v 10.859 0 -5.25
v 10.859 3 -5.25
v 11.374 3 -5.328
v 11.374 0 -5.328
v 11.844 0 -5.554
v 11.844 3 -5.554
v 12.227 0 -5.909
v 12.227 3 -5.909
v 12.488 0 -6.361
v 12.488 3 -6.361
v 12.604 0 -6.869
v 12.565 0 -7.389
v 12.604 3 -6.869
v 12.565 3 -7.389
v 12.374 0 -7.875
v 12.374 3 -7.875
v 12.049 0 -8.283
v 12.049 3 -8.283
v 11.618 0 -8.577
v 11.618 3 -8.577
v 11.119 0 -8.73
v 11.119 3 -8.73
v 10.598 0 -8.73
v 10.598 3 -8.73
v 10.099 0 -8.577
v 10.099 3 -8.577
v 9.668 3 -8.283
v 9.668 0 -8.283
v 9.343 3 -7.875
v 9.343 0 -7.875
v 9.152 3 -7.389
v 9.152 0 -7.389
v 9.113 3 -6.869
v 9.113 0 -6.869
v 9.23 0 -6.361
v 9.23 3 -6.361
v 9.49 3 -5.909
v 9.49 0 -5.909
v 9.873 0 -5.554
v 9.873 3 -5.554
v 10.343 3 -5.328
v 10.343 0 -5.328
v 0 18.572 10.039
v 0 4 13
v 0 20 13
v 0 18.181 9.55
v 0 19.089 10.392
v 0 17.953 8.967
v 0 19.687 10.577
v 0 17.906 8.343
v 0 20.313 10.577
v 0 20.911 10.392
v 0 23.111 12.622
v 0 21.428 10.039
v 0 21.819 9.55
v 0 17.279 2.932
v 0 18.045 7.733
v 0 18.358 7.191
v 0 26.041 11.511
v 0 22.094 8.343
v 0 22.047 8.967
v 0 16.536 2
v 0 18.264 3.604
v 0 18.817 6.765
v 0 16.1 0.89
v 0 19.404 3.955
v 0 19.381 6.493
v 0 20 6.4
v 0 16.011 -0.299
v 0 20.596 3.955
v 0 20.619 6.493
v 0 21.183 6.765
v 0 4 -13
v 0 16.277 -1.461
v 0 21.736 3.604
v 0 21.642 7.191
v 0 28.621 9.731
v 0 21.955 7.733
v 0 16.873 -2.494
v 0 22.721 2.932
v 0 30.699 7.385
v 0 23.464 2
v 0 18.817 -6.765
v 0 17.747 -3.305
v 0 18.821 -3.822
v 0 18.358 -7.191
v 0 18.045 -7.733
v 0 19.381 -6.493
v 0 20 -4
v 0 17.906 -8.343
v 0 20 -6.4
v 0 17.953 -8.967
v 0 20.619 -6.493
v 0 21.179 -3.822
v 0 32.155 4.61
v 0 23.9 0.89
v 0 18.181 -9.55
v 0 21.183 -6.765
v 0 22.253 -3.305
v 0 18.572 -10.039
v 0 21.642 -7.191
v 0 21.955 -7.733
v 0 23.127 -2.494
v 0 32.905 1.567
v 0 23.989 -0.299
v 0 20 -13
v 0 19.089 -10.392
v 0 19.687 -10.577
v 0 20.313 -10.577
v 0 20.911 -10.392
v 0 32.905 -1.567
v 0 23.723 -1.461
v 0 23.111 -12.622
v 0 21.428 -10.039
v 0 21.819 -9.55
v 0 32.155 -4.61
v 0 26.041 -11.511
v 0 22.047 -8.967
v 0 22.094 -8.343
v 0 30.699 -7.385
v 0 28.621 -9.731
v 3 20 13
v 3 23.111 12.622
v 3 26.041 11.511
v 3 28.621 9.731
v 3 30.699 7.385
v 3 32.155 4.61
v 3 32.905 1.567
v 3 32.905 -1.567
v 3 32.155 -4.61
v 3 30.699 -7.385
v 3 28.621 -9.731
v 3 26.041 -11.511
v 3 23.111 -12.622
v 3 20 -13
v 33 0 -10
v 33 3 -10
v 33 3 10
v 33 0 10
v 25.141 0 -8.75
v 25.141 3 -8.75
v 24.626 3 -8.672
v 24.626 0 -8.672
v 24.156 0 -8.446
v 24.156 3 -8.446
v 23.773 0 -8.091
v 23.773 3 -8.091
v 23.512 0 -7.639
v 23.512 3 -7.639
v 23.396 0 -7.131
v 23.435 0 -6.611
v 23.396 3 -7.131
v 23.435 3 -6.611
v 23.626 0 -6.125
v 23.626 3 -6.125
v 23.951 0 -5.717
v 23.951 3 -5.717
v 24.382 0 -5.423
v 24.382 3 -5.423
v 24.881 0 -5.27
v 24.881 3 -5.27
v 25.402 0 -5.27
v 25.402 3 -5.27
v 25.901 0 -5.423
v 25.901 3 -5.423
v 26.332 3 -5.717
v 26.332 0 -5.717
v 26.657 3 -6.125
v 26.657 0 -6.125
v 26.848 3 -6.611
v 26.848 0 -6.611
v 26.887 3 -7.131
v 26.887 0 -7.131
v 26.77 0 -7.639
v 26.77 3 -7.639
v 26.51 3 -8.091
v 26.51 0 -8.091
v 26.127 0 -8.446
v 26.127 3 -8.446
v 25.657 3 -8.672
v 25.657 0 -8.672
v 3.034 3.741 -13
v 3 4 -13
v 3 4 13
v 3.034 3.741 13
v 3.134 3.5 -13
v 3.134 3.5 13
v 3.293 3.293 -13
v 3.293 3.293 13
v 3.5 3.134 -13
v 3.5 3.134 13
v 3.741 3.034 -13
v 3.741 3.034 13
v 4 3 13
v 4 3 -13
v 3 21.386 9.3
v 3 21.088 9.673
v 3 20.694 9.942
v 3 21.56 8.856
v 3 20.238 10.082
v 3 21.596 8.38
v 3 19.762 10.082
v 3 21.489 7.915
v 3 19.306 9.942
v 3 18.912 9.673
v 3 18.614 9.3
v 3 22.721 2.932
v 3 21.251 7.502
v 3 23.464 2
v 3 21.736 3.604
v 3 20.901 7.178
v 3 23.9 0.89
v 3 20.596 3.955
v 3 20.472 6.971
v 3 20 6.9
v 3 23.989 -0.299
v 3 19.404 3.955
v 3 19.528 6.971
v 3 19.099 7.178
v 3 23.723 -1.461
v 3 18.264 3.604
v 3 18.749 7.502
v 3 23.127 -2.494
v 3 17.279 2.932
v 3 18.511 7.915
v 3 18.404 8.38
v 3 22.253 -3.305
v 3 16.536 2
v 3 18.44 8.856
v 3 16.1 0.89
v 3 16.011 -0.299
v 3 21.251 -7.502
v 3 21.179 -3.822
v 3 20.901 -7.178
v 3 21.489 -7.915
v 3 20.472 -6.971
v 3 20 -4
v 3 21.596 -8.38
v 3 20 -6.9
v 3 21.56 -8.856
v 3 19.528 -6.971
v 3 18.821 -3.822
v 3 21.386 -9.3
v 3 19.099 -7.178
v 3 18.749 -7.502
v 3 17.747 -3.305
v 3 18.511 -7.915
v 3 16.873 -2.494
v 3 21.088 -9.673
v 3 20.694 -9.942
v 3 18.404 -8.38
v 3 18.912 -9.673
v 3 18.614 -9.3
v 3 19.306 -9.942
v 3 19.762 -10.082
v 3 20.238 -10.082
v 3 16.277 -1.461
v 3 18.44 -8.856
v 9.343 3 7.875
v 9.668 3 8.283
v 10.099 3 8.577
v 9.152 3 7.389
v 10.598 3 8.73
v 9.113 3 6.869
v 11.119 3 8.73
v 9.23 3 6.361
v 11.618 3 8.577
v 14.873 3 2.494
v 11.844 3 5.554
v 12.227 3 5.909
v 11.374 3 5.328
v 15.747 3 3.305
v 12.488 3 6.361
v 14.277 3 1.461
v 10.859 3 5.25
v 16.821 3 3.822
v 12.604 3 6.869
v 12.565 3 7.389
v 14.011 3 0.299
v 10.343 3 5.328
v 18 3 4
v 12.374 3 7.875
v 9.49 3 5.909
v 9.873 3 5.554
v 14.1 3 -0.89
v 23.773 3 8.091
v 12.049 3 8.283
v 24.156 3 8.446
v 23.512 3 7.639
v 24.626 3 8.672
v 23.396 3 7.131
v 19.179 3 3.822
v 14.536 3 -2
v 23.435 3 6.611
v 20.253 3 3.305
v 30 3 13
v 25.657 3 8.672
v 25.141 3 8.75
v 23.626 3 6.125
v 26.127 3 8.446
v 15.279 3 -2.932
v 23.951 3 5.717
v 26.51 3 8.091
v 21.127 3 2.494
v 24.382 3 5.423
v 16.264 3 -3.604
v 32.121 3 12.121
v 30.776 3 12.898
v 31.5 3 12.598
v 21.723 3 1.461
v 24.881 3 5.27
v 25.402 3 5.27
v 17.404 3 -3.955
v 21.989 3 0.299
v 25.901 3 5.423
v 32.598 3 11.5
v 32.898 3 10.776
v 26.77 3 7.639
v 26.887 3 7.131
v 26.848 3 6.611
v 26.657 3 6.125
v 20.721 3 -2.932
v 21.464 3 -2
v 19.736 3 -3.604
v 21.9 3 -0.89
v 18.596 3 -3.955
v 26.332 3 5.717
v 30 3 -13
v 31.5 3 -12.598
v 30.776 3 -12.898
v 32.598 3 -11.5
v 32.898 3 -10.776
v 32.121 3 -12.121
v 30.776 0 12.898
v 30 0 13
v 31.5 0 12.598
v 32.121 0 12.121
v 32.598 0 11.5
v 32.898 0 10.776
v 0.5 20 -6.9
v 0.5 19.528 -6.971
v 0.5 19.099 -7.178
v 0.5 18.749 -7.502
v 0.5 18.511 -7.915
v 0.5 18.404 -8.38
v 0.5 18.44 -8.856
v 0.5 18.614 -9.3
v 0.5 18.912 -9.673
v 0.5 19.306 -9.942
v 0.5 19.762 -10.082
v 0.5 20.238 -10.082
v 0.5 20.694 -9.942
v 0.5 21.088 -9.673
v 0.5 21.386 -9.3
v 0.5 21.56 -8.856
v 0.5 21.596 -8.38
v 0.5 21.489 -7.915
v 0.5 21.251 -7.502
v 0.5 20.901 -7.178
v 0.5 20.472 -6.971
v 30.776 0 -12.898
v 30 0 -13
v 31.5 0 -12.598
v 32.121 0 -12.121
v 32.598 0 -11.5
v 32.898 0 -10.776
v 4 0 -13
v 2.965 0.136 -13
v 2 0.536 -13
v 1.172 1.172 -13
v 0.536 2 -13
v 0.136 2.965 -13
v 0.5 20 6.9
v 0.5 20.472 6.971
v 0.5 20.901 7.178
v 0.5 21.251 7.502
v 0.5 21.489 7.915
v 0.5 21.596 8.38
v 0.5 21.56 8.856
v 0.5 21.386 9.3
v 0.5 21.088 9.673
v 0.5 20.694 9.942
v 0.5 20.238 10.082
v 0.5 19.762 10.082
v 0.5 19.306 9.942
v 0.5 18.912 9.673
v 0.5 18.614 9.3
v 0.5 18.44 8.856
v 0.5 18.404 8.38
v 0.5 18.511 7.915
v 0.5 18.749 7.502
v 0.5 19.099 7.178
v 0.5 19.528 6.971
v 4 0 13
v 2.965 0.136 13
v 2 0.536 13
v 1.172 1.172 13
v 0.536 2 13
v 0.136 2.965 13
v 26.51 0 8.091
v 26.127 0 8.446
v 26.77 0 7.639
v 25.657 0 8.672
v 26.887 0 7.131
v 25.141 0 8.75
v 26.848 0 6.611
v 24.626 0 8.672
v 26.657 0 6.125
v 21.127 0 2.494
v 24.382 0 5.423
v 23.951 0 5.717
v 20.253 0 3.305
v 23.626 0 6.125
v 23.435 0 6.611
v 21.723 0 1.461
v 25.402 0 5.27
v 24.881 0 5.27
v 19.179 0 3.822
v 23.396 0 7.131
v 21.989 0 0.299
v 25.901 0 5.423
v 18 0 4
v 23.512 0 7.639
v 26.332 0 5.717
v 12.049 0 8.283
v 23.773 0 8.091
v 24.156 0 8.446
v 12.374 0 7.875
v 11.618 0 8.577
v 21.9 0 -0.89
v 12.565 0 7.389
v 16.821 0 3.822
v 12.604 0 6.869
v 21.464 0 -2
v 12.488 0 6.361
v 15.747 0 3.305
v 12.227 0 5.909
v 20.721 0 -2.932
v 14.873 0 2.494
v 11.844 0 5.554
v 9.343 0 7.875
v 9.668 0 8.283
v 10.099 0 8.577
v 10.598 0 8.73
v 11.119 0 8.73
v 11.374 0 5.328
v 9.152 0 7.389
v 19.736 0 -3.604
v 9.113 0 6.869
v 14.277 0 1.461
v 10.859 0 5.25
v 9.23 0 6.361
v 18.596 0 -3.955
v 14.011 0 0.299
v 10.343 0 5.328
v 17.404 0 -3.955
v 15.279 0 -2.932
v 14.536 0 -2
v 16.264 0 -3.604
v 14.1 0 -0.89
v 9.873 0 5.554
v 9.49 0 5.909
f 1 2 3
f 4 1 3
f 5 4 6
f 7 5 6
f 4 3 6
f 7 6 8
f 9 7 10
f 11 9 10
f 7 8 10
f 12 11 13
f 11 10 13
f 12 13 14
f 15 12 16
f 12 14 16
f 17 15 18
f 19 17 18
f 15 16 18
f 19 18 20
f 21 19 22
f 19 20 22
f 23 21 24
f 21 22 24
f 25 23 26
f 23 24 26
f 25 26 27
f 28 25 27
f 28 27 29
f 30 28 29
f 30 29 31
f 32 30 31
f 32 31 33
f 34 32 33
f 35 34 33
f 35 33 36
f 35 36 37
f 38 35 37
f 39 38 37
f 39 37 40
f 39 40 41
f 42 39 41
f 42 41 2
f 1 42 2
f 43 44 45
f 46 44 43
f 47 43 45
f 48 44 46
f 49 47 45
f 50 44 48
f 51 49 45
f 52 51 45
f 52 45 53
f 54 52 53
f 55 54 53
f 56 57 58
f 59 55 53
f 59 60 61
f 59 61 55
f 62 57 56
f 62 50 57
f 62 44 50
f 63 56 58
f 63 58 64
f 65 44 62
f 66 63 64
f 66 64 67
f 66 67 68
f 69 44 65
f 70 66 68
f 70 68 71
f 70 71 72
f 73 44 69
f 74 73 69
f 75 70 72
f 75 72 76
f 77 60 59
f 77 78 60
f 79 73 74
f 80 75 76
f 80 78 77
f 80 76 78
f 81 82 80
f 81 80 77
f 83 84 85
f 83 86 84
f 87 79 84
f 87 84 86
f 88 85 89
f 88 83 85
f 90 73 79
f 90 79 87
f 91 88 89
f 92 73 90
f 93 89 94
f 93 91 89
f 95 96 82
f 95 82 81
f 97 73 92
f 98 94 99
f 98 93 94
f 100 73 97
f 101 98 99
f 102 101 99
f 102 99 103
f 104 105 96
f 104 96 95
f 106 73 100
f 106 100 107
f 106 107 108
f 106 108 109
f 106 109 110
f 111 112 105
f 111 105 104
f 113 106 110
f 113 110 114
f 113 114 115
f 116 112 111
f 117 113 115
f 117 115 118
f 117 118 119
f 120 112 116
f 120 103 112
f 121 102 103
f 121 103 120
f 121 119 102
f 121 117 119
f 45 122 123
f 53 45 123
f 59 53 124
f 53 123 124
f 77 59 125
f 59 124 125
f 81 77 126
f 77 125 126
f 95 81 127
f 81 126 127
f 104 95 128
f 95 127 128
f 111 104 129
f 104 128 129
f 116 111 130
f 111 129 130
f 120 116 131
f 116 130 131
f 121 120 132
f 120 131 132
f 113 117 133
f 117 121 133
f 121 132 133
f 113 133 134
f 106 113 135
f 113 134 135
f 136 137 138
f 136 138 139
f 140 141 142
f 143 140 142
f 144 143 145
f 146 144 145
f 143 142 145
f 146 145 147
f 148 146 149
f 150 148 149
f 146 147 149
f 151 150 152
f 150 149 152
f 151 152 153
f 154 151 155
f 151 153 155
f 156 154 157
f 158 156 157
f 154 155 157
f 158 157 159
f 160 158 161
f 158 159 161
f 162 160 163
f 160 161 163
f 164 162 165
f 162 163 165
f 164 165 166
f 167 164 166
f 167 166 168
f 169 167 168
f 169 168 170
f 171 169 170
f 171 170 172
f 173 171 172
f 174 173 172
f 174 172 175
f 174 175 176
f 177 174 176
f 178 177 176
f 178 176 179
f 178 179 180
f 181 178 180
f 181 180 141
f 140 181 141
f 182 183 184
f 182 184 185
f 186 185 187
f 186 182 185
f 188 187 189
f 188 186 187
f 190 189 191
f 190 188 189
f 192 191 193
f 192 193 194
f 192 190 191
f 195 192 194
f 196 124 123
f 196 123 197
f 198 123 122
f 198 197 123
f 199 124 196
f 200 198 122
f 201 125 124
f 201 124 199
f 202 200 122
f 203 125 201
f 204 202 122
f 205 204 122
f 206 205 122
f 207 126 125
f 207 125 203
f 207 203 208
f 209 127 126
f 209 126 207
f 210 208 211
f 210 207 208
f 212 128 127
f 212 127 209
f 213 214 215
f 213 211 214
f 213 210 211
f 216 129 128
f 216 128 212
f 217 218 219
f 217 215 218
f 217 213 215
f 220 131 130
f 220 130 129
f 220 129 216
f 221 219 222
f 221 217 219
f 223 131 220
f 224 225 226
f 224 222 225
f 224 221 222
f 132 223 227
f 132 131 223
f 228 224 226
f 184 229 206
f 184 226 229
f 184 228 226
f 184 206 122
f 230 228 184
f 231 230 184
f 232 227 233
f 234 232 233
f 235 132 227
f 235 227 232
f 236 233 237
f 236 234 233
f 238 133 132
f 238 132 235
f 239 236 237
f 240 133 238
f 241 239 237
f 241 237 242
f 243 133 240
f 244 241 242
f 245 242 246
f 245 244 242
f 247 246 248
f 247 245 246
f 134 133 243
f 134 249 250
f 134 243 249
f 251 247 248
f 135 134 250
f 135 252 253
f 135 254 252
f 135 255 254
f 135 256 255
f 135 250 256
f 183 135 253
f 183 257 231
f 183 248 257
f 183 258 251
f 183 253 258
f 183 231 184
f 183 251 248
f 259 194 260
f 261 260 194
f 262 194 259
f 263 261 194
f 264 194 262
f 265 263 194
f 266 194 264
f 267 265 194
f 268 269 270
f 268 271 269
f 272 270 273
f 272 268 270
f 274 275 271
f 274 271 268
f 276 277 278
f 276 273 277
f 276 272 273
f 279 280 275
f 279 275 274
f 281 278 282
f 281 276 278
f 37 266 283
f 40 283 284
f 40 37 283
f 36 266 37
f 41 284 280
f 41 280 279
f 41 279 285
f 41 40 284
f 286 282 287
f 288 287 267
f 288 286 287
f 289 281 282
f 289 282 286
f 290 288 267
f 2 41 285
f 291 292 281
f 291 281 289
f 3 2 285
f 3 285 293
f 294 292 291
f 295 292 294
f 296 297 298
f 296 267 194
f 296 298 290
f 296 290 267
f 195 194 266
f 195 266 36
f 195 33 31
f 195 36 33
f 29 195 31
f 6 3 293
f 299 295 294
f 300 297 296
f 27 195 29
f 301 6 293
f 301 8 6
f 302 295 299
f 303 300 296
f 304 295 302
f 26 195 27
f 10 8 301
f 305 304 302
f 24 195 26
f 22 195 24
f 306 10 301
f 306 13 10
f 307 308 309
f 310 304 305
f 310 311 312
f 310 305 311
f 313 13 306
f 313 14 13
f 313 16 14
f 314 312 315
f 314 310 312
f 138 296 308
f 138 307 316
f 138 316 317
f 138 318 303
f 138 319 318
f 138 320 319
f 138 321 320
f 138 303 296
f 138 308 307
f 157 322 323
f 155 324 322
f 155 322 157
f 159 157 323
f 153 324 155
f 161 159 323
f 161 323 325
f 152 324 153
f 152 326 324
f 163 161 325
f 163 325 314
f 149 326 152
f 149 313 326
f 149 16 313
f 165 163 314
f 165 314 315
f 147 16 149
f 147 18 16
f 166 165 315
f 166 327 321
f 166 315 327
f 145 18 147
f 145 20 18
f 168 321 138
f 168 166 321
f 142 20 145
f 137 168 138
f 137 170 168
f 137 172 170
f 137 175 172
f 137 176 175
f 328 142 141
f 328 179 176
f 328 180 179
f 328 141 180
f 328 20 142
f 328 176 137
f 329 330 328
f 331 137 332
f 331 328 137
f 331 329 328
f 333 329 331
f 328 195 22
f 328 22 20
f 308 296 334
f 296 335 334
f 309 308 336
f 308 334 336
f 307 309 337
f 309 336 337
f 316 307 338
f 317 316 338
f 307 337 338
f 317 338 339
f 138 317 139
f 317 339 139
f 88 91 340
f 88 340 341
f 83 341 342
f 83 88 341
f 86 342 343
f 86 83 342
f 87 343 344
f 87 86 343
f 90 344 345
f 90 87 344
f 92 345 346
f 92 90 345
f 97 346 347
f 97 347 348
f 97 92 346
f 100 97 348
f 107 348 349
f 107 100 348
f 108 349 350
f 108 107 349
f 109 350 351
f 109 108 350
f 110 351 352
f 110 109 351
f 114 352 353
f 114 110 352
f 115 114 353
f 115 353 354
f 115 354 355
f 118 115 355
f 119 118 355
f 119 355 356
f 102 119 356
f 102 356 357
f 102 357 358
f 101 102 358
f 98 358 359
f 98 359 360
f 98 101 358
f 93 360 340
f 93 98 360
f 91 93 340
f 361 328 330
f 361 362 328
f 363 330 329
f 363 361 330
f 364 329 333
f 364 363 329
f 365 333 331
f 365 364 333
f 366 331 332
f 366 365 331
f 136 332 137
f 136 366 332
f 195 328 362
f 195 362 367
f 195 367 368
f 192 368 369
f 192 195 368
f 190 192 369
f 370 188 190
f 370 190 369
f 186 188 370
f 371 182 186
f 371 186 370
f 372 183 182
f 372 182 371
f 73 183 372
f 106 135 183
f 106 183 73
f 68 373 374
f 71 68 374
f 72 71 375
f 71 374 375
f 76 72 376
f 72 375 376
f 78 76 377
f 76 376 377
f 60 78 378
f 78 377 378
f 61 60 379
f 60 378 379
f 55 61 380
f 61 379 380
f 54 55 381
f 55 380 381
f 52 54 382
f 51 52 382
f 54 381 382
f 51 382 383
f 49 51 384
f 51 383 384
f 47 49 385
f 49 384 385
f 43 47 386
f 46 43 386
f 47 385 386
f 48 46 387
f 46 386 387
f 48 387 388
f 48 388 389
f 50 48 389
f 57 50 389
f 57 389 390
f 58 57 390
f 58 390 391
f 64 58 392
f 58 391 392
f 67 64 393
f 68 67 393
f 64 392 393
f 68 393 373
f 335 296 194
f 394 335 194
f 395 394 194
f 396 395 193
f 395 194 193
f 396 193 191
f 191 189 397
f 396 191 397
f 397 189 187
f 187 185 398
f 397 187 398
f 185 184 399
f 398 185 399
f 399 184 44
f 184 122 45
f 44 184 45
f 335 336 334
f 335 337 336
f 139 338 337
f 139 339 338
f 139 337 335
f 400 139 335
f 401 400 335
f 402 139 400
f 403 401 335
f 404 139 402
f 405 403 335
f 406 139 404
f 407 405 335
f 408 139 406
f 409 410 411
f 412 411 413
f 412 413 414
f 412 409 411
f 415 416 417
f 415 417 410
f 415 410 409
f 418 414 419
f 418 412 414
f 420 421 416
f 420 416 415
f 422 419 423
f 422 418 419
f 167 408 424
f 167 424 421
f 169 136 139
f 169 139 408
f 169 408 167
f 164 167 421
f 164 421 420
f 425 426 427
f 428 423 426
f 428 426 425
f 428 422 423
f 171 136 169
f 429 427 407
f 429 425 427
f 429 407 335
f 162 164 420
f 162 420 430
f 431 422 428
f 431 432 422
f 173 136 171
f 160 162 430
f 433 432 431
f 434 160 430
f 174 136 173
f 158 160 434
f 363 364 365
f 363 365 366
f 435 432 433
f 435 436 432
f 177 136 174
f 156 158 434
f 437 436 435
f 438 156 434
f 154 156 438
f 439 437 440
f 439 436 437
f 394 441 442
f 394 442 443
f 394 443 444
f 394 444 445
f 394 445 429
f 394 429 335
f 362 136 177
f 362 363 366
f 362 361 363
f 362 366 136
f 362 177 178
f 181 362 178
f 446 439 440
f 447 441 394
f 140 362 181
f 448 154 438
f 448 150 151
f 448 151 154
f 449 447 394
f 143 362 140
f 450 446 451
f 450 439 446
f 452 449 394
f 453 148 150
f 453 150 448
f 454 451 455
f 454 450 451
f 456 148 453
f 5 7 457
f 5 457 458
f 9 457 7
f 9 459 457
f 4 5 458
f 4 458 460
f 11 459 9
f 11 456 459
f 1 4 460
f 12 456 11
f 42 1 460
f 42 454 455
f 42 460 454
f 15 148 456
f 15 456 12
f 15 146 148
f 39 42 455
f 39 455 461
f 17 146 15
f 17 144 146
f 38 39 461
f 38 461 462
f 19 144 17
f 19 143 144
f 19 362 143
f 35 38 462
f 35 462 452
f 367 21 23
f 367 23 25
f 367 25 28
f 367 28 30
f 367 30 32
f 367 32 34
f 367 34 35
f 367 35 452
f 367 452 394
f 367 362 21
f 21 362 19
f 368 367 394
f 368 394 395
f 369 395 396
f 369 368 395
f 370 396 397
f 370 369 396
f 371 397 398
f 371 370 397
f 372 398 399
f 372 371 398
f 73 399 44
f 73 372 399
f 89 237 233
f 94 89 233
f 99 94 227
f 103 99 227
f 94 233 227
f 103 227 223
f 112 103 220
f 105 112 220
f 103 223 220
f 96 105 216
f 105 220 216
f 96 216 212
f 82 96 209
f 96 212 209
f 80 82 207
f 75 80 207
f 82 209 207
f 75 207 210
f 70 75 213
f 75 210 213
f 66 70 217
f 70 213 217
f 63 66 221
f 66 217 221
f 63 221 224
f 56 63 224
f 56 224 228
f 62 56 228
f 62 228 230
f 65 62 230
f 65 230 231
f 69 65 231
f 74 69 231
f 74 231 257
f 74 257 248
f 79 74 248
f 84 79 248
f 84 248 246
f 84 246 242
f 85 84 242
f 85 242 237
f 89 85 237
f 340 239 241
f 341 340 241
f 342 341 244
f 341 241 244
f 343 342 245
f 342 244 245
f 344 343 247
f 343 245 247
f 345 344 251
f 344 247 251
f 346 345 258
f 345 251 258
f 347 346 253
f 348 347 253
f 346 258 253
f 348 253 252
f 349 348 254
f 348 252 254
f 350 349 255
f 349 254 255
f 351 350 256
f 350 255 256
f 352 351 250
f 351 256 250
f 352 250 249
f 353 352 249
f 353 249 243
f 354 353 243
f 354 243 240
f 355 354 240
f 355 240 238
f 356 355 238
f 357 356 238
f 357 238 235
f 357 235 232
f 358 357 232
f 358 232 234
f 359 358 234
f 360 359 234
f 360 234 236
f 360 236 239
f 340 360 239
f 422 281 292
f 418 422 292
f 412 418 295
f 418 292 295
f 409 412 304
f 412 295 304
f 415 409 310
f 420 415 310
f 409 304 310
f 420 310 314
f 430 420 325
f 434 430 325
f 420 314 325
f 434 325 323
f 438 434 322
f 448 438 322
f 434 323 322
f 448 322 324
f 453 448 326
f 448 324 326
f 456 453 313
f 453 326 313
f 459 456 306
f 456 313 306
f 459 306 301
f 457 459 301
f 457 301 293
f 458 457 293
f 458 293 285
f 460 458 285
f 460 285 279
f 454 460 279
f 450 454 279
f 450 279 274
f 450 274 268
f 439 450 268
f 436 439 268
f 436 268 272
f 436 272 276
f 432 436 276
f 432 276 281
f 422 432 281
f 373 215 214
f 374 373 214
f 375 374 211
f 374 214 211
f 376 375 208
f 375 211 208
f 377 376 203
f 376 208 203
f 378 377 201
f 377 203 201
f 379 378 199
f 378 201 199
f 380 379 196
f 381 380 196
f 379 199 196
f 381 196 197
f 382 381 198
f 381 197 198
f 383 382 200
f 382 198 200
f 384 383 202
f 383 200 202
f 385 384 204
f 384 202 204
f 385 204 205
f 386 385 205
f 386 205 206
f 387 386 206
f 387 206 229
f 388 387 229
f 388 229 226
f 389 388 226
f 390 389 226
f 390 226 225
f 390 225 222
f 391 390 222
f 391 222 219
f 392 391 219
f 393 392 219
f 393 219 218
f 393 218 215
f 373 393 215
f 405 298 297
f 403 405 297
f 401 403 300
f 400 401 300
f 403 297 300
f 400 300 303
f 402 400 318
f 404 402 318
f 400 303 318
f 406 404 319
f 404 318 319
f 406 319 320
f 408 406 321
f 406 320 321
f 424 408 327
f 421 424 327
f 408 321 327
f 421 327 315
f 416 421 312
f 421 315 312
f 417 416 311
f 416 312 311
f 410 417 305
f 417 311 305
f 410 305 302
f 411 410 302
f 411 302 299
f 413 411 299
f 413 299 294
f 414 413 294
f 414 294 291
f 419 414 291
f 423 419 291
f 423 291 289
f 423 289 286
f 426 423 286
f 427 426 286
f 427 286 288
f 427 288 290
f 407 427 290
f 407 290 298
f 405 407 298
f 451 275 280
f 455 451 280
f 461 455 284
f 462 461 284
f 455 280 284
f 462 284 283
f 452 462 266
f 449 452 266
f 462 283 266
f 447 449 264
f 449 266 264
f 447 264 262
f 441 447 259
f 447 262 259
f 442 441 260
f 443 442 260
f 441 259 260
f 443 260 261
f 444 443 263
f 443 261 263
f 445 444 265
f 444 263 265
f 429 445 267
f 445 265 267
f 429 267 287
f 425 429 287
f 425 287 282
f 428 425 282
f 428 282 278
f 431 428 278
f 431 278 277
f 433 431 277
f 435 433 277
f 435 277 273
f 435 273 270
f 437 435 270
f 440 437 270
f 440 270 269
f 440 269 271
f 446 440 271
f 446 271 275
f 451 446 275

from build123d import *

# Parameters (mm, degrees)
EXTRU_MINCE1_DEPTH      = 13
EXTRU_MINCE1_DEPTH_BACK = 13
ESQUISSE2_R             = 4
ESQUISSE2_R_2           = 1.75
ENL_V_MAT_EXTRU_1_DEPTH = 47.454278597
ESQUISSE3_R             = 4
ESQUISSE3_R_2           = 1.6
ENL_V_MAT_EXTRU_2_DEPTH = 47.454278597
CHANFREIN1_SIZE         = 0.5
CONG_1_R                = 3


with BuildPart() as part:
    # Esquisse1 → Extru.-Mince1 (new, two sides: drawn at the far end of the back side and taken through both)
    with BuildSketch(Plane.XY.offset(-EXTRU_MINCE1_DEPTH_BACK)):
        with BuildLine():
            Line((33, 0), (4, 0))
            ThreePointArc((4, 0), (1.171572875, 1.171572875), (0, 4))
            Line((0, 4), (0, 33))
            Line((0, 33), (3, 33))
            Line((3, 33), (3, 4))
            ThreePointArc((3, 4), (3.292893219, 3.292893219), (4, 3))
            Line((4, 3), (33, 3))
            Line((33, 3), (33, 0))
        make_face()
    extrude(amount=EXTRU_MINCE1_DEPTH + EXTRU_MINCE1_DEPTH_BACK)

    # Esquisse2 → Enlèv. mat.-Extru.1 (cut, through all)
    with BuildSketch(Plane(origin=(0, 3, 0), x_dir=(1, 0, 0), z_dir=(0, 1, 0))):
        with Locations(Location((18, 0, 0), (0, 0, 270))):
            Circle(ESQUISSE2_R)
        with Locations(Location((10.858571571, 7, 0), (0, 0, 270))):
            Circle(ESQUISSE2_R_2)
        with Locations(Location((10.858571571, -7, 0), (0, 0, 90))):
            Circle(ESQUISSE2_R_2)
        with Locations(Location((25.141428429, -7, 0), (0, 0, 270))):
            Circle(ESQUISSE2_R_2)
        with Locations(Location((25.141428429, 7, 0), (0, 0, 90))):
            Circle(ESQUISSE2_R_2)
    extrude(amount=-ENL_V_MAT_EXTRU_1_DEPTH, mode=Mode.SUBTRACT)

    # Esquisse3 → Enlèv. mat.-Extru.2 (cut, through all)
    with BuildSketch(Plane(origin=(3, 0, 0), x_dir=(0, 0, -1), z_dir=(1, 0, 0))):
        with Locations((0, 20)):
            Circle(ESQUISSE3_R)
        with Locations((-8.5, 20)):
            Circle(ESQUISSE3_R_2)
        with Locations(Location((8.5, 20, 0), (0, 0, 180))):
            Circle(ESQUISSE3_R_2)
        with BuildLine():
            Line((13, 20), (15, 20))
            Line((15, 20), (15, 35))
            Line((15, 35), (-15, 35))
            Line((-15, 35), (-15, 20))
            Line((-15, 20), (-13, 20))
            ThreePointArc((-13, 20), (0, 33), (13, 20))
        make_face()
    extrude(amount=-ENL_V_MAT_EXTRU_2_DEPTH, mode=Mode.SUBTRACT)

    # Chanfrein1
    chanfrein1_edges = [part.edges().sort_by_distance(p)[0] for p in [
        (0, 20, -10.1),
        (0, 20, 10.1),
    ]]
    chamfer(chanfrein1_edges, length=CHANFREIN1_SIZE)

    # Congé1
    cong_1_edges = [part.edges().sort_by_distance(p)[0] for p in [
        (33, 1.5, 13),
        (33, 1.5, -13),
    ]]
    fillet(cong_1_edges, radius=CONG_1_R)


solid = part.part
